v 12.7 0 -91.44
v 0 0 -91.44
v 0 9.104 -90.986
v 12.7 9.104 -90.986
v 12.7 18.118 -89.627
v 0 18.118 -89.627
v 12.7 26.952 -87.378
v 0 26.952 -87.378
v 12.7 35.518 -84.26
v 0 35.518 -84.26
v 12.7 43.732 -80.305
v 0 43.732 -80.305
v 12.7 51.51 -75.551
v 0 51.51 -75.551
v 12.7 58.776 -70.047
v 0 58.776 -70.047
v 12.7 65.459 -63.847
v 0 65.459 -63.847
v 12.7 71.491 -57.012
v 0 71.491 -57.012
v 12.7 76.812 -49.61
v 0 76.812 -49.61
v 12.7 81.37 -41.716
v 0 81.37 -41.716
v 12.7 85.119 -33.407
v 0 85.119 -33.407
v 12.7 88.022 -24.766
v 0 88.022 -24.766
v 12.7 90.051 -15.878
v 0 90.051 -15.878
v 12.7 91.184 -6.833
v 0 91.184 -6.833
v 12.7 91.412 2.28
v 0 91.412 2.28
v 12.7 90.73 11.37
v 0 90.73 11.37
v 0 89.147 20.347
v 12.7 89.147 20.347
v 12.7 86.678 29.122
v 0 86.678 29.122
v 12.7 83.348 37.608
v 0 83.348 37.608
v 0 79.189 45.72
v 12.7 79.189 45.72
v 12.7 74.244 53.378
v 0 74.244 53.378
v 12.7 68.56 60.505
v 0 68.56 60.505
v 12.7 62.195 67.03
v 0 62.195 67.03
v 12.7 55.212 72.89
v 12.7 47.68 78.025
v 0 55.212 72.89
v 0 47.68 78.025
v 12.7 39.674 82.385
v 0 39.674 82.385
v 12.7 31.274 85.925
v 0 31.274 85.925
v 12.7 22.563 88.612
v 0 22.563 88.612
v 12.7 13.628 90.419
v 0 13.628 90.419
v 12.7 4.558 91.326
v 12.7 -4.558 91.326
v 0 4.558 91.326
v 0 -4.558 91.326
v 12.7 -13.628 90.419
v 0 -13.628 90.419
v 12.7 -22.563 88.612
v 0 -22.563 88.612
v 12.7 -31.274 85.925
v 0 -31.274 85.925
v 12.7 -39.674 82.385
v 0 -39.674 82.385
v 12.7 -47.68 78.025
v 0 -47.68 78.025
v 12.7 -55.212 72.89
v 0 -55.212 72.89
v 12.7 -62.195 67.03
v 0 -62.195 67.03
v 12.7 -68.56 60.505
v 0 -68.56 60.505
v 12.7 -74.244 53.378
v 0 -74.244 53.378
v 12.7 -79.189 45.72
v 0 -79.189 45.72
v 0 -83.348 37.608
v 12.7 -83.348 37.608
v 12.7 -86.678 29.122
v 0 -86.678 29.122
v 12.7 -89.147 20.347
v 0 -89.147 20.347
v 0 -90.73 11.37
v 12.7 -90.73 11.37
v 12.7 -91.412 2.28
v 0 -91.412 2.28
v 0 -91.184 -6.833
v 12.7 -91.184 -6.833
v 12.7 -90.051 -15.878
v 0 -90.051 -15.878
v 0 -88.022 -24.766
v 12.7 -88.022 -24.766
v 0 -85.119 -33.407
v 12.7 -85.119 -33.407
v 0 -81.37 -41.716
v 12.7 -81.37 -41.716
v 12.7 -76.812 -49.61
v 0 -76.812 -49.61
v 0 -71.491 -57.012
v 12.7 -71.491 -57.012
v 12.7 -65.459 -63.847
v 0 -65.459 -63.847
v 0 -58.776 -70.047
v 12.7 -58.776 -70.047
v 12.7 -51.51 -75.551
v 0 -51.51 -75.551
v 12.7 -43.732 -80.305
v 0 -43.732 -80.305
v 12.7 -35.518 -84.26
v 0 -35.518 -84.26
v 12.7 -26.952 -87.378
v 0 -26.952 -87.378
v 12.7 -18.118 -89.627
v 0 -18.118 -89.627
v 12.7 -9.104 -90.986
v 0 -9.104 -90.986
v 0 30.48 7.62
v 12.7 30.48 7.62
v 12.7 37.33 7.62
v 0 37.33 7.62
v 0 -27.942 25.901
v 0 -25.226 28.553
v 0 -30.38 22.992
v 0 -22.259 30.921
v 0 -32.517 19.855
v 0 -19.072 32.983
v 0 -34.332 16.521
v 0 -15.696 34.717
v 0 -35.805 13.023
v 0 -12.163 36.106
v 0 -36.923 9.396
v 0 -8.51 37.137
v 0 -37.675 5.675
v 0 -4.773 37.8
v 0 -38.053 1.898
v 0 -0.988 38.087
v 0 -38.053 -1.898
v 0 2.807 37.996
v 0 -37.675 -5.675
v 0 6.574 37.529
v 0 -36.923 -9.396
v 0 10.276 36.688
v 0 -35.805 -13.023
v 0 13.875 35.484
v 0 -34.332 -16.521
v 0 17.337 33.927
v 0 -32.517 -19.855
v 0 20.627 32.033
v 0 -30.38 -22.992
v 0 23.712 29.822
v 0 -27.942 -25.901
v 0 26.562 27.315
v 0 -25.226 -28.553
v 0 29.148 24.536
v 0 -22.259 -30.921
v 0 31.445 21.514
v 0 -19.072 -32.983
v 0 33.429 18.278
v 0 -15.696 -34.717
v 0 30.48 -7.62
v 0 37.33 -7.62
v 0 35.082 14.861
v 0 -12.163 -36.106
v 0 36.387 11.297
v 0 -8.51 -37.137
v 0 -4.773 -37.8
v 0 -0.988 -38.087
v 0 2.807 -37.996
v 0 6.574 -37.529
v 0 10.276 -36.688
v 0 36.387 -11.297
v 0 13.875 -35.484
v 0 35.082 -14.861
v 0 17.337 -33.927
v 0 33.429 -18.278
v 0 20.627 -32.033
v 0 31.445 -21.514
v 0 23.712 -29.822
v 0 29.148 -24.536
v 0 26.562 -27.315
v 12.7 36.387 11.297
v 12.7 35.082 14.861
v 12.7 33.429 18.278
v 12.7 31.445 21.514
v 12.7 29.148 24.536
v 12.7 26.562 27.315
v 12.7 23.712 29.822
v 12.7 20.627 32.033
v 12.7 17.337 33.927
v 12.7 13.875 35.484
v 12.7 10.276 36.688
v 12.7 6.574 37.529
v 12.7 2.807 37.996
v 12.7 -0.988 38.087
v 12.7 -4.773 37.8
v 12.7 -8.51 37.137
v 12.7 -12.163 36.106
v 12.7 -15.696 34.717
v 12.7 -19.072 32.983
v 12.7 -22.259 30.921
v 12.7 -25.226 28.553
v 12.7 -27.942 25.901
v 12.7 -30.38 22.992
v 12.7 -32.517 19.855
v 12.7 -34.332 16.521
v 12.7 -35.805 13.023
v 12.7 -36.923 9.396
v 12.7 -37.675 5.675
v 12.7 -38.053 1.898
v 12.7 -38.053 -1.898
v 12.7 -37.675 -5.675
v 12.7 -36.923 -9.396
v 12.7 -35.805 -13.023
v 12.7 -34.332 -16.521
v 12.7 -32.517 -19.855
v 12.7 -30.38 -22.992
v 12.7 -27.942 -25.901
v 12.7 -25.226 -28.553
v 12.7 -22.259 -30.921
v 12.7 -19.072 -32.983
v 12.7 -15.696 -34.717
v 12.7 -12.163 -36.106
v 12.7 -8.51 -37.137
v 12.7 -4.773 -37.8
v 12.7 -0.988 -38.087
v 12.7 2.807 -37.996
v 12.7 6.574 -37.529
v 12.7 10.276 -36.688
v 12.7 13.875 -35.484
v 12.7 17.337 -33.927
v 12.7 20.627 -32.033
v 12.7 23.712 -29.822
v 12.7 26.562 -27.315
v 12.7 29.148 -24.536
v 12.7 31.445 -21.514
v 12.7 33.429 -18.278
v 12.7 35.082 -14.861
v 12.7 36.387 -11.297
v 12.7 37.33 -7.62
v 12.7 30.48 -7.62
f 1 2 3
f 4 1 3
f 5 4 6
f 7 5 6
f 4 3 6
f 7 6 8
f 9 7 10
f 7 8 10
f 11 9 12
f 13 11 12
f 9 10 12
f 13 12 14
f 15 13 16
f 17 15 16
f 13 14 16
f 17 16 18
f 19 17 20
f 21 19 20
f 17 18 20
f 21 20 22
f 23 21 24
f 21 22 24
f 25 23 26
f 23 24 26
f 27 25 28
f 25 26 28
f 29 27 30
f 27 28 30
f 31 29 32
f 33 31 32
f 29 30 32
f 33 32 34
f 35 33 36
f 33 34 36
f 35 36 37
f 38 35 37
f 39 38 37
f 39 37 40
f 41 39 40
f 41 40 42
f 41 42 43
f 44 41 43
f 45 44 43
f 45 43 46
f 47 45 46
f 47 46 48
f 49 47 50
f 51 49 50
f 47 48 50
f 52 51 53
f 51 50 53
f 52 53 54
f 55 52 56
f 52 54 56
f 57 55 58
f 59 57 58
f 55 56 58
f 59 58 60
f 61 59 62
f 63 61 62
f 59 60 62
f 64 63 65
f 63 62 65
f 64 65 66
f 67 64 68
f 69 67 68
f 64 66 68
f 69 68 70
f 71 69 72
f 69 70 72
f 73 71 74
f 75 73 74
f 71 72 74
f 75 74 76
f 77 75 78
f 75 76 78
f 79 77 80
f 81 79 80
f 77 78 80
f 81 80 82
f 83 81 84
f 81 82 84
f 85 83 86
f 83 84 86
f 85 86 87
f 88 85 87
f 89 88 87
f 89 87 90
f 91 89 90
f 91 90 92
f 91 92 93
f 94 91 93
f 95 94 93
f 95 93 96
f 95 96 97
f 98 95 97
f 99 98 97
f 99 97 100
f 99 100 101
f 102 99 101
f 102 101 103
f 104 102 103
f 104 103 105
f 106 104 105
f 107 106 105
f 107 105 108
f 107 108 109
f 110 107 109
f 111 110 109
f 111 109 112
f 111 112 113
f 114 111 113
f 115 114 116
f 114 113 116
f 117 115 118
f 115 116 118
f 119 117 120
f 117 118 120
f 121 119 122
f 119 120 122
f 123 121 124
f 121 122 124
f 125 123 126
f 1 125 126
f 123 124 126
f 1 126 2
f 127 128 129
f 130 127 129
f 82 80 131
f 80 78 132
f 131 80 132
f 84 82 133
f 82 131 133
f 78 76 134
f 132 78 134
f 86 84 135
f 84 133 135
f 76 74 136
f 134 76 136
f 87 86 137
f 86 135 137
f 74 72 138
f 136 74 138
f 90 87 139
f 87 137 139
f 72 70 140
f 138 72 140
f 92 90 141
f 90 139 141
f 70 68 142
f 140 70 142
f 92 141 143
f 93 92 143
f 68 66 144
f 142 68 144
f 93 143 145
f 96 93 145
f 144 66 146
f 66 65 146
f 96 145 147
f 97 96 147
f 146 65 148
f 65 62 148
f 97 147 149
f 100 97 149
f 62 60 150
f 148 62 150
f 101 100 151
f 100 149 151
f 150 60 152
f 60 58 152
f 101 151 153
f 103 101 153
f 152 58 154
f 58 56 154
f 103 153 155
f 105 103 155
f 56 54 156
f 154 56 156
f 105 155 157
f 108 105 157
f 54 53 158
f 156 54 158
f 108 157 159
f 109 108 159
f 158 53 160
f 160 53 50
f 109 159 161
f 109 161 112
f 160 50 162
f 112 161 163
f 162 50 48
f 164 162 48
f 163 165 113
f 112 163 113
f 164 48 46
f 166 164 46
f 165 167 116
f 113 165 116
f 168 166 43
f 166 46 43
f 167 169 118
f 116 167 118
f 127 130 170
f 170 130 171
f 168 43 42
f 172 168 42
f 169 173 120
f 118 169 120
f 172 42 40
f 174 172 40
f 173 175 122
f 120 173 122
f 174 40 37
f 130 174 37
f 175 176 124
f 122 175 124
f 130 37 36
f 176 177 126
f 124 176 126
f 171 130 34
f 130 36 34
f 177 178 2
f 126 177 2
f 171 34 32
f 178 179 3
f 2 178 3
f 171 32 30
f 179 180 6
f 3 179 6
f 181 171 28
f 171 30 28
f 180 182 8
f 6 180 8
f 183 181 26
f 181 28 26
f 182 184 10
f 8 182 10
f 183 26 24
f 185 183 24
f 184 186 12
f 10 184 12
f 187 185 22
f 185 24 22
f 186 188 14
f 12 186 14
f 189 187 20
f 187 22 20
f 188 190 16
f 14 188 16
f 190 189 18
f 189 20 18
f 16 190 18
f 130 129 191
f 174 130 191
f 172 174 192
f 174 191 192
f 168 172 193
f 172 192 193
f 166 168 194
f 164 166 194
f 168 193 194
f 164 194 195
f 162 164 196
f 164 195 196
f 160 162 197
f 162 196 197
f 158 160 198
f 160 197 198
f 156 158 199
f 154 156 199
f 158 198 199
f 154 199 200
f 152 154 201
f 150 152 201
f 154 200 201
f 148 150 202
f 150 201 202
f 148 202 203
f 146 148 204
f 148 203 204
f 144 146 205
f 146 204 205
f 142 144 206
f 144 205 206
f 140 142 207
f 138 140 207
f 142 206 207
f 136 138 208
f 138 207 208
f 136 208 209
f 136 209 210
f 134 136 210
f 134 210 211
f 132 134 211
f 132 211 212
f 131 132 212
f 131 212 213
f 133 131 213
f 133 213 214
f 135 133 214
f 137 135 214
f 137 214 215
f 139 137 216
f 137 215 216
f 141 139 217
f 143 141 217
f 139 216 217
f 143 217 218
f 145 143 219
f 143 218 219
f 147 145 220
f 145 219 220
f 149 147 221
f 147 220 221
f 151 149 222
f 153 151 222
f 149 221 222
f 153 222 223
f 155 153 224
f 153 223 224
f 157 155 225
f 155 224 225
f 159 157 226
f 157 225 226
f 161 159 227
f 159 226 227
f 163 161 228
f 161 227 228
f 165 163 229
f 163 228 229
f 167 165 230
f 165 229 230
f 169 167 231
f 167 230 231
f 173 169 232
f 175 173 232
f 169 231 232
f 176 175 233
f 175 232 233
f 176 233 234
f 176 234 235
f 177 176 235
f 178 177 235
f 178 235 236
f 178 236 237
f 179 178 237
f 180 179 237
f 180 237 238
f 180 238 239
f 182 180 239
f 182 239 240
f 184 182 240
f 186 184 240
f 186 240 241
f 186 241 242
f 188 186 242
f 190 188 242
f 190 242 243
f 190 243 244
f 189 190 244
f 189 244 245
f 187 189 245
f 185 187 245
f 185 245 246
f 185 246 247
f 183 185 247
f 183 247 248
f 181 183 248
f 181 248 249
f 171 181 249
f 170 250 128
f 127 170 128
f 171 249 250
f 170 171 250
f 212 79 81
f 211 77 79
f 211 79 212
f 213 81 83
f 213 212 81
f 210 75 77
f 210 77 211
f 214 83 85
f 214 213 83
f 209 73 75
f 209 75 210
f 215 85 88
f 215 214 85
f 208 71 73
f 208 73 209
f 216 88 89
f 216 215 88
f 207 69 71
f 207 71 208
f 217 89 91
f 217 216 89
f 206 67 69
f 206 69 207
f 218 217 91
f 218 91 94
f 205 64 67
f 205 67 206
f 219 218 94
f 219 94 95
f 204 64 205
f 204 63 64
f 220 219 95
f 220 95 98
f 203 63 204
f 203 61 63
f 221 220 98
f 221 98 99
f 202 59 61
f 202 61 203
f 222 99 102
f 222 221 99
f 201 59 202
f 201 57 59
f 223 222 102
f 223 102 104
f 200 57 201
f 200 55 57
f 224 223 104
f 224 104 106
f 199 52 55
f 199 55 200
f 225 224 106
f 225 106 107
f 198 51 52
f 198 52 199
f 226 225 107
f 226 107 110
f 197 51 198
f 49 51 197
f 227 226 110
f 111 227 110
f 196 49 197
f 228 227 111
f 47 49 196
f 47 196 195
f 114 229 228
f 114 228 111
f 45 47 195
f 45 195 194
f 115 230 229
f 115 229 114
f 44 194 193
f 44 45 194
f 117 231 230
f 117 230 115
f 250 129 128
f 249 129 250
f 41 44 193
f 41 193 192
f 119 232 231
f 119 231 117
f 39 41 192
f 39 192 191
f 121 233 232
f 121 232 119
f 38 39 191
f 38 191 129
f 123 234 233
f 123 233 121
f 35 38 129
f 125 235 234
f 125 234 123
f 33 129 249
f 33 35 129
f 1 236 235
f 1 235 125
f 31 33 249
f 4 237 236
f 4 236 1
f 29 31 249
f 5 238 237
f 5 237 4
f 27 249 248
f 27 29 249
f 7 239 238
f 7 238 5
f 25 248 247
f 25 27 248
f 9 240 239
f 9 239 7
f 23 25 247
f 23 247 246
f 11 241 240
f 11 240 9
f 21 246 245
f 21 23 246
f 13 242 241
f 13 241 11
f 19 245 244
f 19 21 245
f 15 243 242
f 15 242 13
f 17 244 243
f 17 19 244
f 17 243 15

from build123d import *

# Parameters (mm, degrees)
SKETCH1_R           = 91.44
BOSS_EXTRUDE1_DEPTH = 12.7
CUT_EXTRUDE1_DEPTH  = 12.7


with BuildPart() as part:
    # Sketch1 → Boss-Extrude1 (new body)
    with BuildSketch(Plane(origin=(0, 0, 0), x_dir=(0, 0, -1), z_dir=(1, 0, 0))):
        Circle(SKETCH1_R)
    extrude(amount=BOSS_EXTRUDE1_DEPTH)

    # Sketch2 → Cut-Extrude1 (cut)
    with BuildSketch(Plane(origin=(12.7, 0, 0), x_dir=(0, 0, -1), z_dir=(1, 0, 0))):
        with BuildLine():
            Line((7.62, 37.33022368), (7.62, 30.48))
            Line((7.62, 30.48), (-7.62, 30.48))
            Line((-7.62, 30.48), (-7.62, 37.33022368))
            ThreePointArc((-7.62, 37.33022368), (0, -38.1), (7.62, 37.33022368))
        make_face()
    extrude(amount=-CUT_EXTRUDE1_DEPTH, mode=Mode.SUBTRACT)


solid = part.part
